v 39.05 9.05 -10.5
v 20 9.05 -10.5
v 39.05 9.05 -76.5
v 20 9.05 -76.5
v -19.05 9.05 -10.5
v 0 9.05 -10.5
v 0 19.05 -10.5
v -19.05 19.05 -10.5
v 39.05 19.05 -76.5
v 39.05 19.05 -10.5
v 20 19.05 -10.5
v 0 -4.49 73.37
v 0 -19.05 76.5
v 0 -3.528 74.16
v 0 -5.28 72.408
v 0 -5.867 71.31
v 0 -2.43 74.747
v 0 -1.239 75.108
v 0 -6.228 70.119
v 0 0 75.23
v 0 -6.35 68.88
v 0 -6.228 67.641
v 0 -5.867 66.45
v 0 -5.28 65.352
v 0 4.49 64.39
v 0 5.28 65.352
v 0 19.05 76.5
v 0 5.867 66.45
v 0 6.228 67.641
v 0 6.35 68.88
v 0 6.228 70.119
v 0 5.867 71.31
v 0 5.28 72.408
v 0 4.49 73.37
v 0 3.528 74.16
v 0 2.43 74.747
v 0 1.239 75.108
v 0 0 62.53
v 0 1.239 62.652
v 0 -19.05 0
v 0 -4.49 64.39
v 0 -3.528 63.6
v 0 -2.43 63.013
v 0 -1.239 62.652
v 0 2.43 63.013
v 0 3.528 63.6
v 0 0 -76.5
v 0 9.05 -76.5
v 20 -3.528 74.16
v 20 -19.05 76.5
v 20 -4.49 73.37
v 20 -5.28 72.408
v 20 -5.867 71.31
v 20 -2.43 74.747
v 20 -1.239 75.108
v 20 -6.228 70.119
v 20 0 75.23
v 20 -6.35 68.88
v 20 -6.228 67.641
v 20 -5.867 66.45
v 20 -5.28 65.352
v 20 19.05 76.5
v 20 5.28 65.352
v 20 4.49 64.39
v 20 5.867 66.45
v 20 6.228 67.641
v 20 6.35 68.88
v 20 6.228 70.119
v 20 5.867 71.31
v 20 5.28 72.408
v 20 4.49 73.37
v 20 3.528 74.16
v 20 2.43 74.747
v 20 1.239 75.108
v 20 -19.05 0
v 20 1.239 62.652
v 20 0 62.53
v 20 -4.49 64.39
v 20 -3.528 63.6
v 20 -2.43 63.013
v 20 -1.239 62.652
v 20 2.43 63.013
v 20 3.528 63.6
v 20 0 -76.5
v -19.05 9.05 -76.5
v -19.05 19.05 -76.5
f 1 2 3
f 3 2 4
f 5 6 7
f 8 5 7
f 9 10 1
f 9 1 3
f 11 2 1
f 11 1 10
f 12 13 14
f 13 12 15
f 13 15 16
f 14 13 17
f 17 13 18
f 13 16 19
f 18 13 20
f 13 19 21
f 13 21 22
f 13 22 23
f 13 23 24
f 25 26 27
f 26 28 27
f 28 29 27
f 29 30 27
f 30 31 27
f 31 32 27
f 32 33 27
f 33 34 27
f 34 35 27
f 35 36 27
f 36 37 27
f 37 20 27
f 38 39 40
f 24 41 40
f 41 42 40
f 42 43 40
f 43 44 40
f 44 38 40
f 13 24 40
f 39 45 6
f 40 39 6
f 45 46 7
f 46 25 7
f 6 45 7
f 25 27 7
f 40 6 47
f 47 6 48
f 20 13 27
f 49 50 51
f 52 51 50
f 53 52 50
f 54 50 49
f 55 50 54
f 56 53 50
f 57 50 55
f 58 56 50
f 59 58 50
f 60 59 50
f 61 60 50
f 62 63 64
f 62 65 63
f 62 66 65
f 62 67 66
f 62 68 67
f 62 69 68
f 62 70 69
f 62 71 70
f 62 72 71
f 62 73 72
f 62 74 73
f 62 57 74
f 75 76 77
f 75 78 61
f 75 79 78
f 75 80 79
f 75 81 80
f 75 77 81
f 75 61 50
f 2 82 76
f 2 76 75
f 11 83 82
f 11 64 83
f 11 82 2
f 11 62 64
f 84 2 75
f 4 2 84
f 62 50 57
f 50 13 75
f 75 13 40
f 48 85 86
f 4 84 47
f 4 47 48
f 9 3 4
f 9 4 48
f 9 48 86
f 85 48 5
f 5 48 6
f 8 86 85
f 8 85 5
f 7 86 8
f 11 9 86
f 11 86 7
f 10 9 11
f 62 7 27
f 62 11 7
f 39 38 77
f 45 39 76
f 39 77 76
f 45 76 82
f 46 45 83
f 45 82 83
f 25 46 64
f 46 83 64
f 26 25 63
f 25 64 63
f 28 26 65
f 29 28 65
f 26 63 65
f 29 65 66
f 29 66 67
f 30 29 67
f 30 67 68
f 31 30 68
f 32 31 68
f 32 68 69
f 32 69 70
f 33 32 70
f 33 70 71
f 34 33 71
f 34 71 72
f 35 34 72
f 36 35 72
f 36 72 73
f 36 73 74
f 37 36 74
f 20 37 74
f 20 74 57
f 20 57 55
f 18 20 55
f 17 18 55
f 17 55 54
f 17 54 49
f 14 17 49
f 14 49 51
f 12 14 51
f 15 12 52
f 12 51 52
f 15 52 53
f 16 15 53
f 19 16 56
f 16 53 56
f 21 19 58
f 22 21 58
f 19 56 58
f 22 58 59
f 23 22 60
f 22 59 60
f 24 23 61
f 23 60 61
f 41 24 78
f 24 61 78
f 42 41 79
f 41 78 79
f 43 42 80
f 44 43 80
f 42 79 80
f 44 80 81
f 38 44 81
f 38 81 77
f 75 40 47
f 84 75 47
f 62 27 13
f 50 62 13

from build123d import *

# Parameters (mm, degrees)
BOSS_EXTRUDE1_DEPTH = 20
SKETCH3_W           = 66
SKETCH3_H           = 10
BOSS_EXTRUDE2_DEPTH = 19.05
SKETCH4_W           = 66
SKETCH4_H           = 10
BOSS_EXTRUDE3_DEPTH = 19.05
SKETCH5_R           = 6.35
CUT_EXTRUDE2_DEPTH  = 40.05


with BuildPart() as part:
    # Sketch1 → Boss-Extrude1 (new body)
    with BuildSketch(Plane(origin=(0, 0, 0), x_dir=(0, 0, -1), z_dir=(1, 0, 0))):
        Polygon((0, -19.05), (76.5, 0), (76.5, 19.05), (-76.5, 19.05), (-76.5, -19.05), align=None)
    extrude(amount=BOSS_EXTRUDE1_DEPTH)

    # Sketch3 → Boss-Extrude2 (add)
    with BuildSketch(Plane(origin=(20, 0, 0), x_dir=(0, 0, -1), z_dir=(1, 0, 0))):
        with Locations((43.5, 14.05)):
            Rectangle(SKETCH3_W, SKETCH3_H)
    extrude(amount=BOSS_EXTRUDE2_DEPTH)

    # Sketch4 → Boss-Extrude3 (add)
    with BuildSketch(Plane.ZY):
        with Locations((-43.5, 14.05)):
            Rectangle(SKETCH4_W, SKETCH4_H)
    extrude(amount=BOSS_EXTRUDE3_DEPTH)

    # Sketch5 → Cut-Extrude2 (cut, through all)
    with BuildSketch(Plane(origin=(20, 0, 0), x_dir=(0, 0, -1), z_dir=(1, 0, 0))):
        with Locations((-68.88, 0)):
            Circle(SKETCH5_R)
    extrude(amount=-CUT_EXTRUDE2_DEPTH, mode=Mode.SUBTRACT)


solid = part.part
